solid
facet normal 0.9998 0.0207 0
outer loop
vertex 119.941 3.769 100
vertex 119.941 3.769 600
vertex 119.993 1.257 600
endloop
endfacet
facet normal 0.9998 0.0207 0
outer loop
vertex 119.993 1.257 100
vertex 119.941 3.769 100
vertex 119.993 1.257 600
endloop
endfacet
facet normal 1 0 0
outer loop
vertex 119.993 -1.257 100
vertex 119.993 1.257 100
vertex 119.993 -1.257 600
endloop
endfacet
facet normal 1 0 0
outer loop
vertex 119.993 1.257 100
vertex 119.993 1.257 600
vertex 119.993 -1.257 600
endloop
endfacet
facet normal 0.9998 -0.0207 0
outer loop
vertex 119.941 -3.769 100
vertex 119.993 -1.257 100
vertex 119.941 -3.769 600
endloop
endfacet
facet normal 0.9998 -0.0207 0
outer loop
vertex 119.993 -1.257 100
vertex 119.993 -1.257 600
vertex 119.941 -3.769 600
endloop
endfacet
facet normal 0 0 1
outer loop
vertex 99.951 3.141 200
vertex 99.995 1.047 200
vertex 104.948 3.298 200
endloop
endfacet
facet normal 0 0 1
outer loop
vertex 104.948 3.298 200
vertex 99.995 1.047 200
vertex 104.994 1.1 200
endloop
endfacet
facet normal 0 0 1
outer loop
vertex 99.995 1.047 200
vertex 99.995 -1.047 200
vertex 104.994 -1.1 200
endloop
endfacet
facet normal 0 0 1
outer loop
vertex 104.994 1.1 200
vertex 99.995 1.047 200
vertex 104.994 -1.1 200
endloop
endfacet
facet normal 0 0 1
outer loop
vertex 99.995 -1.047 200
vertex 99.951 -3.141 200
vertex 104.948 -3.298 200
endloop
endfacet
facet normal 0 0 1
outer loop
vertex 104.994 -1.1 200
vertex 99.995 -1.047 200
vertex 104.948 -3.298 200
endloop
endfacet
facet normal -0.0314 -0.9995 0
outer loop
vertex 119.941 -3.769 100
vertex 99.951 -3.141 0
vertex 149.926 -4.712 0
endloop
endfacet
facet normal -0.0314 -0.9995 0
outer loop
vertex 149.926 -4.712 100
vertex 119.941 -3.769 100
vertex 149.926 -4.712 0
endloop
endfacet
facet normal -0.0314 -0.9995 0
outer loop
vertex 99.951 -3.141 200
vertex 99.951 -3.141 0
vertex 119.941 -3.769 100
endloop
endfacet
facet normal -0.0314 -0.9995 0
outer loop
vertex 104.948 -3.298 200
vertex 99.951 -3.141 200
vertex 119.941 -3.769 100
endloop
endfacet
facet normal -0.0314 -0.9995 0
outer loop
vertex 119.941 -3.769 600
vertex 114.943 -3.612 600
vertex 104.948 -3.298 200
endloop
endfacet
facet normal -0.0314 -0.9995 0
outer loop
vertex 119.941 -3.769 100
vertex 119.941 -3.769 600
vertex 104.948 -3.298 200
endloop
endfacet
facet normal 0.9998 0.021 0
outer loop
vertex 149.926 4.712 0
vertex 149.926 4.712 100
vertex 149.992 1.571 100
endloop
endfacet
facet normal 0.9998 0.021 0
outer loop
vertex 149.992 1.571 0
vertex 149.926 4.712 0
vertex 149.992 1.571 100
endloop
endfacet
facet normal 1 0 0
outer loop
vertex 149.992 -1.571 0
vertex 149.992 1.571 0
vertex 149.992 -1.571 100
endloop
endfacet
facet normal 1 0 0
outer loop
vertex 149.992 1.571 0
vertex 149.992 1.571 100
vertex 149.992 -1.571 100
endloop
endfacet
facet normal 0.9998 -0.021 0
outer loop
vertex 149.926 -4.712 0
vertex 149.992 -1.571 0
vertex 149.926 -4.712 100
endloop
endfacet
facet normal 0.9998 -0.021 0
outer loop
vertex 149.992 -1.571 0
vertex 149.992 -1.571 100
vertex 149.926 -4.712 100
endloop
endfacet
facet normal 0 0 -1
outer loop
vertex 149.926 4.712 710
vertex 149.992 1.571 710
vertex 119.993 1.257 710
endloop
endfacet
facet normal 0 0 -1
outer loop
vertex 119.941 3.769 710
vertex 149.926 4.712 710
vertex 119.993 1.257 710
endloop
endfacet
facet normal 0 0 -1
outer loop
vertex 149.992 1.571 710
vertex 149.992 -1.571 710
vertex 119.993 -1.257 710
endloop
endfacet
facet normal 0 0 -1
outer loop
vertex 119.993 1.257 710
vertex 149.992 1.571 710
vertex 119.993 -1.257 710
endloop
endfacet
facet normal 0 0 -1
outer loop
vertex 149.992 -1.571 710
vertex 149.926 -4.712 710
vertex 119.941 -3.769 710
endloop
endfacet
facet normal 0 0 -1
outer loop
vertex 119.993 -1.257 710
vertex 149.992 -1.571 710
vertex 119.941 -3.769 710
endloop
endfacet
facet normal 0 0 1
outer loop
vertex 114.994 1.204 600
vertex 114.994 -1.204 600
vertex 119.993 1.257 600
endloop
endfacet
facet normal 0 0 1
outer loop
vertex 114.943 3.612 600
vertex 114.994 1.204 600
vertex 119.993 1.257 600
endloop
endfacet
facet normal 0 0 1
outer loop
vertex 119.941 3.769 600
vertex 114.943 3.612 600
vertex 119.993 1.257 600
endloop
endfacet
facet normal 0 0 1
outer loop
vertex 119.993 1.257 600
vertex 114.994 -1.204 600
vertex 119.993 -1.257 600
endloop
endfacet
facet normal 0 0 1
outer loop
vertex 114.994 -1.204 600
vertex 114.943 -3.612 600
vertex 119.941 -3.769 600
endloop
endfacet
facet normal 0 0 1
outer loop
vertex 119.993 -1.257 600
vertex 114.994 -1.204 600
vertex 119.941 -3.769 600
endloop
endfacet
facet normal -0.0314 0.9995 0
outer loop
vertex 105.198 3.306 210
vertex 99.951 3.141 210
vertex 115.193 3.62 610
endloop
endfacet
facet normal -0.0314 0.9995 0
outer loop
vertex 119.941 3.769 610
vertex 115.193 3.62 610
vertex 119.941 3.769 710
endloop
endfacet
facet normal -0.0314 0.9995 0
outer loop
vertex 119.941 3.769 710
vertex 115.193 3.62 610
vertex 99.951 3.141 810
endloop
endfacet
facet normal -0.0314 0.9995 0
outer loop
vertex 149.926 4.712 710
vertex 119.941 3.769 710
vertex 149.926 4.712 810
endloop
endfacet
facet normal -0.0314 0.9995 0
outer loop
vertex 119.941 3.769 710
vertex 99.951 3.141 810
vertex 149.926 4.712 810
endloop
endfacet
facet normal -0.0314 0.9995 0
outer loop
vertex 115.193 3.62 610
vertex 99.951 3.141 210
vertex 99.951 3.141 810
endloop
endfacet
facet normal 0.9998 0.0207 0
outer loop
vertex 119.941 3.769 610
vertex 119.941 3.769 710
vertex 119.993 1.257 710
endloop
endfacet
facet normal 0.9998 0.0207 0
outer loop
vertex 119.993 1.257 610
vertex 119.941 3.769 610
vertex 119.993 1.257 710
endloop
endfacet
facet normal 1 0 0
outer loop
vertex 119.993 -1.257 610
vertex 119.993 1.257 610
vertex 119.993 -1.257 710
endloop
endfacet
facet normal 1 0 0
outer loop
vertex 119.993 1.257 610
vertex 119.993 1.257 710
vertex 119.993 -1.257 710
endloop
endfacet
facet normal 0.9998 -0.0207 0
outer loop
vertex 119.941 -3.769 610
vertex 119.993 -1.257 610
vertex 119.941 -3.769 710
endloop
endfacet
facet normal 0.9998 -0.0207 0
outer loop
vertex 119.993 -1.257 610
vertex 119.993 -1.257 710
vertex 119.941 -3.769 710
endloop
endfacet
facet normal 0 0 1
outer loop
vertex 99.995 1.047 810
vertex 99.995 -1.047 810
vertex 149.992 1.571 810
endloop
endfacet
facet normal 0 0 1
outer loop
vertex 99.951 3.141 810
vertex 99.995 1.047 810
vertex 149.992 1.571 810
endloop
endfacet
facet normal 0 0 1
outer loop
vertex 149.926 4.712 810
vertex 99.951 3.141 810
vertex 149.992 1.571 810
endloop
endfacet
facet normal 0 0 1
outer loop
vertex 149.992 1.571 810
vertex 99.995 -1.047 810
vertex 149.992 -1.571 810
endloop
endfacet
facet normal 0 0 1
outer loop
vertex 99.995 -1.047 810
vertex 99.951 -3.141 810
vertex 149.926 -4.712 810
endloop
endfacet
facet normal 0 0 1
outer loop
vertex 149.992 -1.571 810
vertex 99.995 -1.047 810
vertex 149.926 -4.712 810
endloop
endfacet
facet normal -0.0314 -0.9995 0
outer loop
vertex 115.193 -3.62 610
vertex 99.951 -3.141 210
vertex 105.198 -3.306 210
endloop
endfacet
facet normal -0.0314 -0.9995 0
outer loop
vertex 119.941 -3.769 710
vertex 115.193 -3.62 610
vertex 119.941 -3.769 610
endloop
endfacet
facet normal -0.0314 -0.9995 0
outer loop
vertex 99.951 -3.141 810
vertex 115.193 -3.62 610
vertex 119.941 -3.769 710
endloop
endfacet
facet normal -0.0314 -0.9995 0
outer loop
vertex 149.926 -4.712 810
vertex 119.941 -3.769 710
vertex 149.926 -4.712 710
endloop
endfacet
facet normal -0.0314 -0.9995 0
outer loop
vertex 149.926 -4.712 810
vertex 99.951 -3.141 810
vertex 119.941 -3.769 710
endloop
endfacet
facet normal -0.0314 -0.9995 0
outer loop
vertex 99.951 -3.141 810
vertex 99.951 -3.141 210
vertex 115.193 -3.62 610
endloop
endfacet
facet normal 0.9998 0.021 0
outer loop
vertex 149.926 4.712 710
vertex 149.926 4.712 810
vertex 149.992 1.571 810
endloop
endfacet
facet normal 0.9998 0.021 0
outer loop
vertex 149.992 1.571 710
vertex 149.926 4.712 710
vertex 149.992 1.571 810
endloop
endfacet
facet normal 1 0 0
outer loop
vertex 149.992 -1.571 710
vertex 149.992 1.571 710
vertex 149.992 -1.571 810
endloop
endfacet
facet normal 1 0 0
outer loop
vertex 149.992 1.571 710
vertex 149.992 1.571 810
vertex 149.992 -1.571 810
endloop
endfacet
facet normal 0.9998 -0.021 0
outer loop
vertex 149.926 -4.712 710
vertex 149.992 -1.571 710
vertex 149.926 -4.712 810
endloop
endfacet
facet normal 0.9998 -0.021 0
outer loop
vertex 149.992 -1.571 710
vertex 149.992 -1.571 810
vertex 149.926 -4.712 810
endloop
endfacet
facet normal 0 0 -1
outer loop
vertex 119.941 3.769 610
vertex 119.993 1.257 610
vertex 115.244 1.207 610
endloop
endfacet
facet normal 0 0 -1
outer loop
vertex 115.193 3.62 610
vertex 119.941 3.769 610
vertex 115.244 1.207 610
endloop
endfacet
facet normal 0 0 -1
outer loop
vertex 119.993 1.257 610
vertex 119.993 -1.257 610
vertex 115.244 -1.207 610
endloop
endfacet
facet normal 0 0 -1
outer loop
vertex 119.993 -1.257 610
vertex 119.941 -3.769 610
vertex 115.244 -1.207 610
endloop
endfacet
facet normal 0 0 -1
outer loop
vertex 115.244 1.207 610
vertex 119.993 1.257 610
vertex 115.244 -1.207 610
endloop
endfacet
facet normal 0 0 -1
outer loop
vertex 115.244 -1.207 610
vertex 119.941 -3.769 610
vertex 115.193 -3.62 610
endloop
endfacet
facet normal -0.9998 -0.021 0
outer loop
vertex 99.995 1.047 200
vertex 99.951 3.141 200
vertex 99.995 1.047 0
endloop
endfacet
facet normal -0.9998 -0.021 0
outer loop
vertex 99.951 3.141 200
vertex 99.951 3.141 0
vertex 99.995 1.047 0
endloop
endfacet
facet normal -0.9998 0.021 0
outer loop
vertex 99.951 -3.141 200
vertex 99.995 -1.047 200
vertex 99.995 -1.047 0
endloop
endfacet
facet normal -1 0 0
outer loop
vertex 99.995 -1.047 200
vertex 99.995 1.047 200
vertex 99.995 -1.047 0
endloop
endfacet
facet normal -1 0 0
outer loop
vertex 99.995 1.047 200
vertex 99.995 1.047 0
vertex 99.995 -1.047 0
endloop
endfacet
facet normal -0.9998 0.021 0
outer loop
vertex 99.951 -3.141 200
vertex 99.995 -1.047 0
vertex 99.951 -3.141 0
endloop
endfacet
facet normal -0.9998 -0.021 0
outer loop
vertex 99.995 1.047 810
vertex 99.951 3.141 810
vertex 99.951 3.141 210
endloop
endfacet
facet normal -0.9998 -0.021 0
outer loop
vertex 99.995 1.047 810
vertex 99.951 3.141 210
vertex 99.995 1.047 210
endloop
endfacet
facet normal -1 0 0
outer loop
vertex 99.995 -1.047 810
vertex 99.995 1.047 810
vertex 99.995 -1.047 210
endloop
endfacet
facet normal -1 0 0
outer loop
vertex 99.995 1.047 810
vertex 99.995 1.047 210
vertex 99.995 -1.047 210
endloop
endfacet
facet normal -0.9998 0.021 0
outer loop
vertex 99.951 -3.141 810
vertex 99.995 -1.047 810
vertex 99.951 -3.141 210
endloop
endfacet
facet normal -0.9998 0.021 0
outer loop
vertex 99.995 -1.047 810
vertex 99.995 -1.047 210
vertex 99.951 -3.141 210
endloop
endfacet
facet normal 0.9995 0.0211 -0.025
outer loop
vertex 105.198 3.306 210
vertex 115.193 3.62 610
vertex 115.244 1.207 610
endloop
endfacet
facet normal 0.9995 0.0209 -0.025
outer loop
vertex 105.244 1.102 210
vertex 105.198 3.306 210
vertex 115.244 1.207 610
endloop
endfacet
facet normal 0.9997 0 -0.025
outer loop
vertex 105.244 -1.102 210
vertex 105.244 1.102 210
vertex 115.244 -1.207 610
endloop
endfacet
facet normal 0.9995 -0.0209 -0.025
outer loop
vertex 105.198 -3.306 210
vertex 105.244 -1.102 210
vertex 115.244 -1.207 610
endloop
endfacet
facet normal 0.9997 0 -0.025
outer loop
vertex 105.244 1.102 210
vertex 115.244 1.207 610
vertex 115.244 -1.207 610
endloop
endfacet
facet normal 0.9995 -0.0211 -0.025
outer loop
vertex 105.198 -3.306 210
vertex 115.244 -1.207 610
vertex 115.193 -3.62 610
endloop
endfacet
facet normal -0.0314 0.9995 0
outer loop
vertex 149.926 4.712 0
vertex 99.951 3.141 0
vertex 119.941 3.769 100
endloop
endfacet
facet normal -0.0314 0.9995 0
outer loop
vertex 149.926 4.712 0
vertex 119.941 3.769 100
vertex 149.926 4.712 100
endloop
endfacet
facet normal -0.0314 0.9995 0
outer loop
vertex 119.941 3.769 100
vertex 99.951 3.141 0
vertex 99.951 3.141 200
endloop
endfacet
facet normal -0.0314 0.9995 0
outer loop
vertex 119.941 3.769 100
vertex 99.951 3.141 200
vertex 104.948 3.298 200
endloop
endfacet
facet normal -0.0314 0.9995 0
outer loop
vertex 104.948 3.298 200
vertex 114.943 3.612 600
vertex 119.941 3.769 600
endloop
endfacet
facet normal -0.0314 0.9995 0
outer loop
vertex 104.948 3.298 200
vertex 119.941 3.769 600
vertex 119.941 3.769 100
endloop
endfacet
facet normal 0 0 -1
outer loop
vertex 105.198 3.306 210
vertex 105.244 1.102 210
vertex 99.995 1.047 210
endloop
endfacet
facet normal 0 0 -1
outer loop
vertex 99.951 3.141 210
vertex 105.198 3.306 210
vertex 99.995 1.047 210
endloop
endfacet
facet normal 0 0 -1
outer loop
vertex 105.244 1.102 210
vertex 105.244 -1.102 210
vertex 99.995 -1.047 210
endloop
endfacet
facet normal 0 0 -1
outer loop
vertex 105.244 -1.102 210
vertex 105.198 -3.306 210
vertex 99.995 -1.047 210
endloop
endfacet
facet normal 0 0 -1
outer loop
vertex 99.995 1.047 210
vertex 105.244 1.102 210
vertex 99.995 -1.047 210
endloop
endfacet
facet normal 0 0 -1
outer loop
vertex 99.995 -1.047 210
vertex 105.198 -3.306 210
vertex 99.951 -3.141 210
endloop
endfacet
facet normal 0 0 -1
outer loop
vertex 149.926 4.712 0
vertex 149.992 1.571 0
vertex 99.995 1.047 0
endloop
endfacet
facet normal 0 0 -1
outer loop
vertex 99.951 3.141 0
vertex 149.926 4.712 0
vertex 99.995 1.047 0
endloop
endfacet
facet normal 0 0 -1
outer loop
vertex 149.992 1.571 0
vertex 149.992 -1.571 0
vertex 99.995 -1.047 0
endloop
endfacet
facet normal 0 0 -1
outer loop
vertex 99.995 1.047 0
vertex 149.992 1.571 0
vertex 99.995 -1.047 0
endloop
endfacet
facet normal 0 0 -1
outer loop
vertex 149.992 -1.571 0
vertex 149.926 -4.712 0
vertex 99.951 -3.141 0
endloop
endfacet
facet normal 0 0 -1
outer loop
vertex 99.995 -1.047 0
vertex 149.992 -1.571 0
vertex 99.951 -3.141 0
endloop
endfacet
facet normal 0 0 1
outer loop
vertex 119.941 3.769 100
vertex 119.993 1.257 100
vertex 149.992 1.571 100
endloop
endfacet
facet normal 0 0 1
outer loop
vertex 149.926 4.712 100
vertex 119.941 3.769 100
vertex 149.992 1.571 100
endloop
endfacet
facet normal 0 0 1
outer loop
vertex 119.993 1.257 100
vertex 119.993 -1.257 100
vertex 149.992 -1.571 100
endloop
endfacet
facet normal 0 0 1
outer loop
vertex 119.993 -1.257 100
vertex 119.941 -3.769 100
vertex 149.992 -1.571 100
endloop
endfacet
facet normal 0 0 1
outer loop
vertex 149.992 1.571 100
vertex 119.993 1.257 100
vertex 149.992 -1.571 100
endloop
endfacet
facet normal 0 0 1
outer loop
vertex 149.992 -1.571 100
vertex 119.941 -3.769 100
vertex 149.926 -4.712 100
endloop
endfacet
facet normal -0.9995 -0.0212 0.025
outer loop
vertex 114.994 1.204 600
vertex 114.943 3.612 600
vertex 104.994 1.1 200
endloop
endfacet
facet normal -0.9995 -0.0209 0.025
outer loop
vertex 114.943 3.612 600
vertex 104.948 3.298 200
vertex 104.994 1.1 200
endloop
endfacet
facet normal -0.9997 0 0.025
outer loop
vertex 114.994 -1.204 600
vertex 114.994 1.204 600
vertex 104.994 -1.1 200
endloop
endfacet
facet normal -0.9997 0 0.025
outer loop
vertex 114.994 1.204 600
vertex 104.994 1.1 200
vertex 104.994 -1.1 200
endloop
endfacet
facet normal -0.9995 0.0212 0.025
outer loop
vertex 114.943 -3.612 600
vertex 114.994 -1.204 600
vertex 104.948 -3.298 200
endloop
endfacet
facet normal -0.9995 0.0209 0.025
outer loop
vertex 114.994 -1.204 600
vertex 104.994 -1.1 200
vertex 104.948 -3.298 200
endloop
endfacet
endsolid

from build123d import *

# Parameters (mm, degrees)
F1_ANGLE = 3.6
F2_ANGLE = 3.6


with BuildPart() as f1:
    # F0 (on Front) → F1 (revolve, symmetric)
    with BuildSketch(Plane.XZ) as f1_sk:
        Polygon((100, 210), (105.25, 210), (115, 600), (115.25, 610), (120, 610), (120, 710), (150, 710), (150, 810), (100, 810), align=None)
    revolve(axis=Axis((0, 0, 405), (0, 0, 1)), revolution_arc=F1_ANGLE / 2)
    revolve(f1_sk.sketch, axis=Axis((0, 0, 405), (0, 0, -1)), revolution_arc=F1_ANGLE / 2)


with BuildPart() as f2:
    # F0 (on Front) → F2 (revolve, symmetric)
    with BuildSketch(Plane.XZ) as f2_sk:
        Polygon((100, 200), (100, 0), (150, 0), (150, 100), (120, 100), (120, 600), (115, 600), (105.25, 210), (105, 200), align=None)
    revolve(axis=Axis((0, 0, 405), (0, 0, 1)), revolution_arc=F2_ANGLE / 2)
    revolve(f2_sk.sketch, axis=Axis((0, 0, 405), (0, 0, -1)), revolution_arc=F2_ANGLE / 2)


solid = Compound([f1.part, f2.part])
